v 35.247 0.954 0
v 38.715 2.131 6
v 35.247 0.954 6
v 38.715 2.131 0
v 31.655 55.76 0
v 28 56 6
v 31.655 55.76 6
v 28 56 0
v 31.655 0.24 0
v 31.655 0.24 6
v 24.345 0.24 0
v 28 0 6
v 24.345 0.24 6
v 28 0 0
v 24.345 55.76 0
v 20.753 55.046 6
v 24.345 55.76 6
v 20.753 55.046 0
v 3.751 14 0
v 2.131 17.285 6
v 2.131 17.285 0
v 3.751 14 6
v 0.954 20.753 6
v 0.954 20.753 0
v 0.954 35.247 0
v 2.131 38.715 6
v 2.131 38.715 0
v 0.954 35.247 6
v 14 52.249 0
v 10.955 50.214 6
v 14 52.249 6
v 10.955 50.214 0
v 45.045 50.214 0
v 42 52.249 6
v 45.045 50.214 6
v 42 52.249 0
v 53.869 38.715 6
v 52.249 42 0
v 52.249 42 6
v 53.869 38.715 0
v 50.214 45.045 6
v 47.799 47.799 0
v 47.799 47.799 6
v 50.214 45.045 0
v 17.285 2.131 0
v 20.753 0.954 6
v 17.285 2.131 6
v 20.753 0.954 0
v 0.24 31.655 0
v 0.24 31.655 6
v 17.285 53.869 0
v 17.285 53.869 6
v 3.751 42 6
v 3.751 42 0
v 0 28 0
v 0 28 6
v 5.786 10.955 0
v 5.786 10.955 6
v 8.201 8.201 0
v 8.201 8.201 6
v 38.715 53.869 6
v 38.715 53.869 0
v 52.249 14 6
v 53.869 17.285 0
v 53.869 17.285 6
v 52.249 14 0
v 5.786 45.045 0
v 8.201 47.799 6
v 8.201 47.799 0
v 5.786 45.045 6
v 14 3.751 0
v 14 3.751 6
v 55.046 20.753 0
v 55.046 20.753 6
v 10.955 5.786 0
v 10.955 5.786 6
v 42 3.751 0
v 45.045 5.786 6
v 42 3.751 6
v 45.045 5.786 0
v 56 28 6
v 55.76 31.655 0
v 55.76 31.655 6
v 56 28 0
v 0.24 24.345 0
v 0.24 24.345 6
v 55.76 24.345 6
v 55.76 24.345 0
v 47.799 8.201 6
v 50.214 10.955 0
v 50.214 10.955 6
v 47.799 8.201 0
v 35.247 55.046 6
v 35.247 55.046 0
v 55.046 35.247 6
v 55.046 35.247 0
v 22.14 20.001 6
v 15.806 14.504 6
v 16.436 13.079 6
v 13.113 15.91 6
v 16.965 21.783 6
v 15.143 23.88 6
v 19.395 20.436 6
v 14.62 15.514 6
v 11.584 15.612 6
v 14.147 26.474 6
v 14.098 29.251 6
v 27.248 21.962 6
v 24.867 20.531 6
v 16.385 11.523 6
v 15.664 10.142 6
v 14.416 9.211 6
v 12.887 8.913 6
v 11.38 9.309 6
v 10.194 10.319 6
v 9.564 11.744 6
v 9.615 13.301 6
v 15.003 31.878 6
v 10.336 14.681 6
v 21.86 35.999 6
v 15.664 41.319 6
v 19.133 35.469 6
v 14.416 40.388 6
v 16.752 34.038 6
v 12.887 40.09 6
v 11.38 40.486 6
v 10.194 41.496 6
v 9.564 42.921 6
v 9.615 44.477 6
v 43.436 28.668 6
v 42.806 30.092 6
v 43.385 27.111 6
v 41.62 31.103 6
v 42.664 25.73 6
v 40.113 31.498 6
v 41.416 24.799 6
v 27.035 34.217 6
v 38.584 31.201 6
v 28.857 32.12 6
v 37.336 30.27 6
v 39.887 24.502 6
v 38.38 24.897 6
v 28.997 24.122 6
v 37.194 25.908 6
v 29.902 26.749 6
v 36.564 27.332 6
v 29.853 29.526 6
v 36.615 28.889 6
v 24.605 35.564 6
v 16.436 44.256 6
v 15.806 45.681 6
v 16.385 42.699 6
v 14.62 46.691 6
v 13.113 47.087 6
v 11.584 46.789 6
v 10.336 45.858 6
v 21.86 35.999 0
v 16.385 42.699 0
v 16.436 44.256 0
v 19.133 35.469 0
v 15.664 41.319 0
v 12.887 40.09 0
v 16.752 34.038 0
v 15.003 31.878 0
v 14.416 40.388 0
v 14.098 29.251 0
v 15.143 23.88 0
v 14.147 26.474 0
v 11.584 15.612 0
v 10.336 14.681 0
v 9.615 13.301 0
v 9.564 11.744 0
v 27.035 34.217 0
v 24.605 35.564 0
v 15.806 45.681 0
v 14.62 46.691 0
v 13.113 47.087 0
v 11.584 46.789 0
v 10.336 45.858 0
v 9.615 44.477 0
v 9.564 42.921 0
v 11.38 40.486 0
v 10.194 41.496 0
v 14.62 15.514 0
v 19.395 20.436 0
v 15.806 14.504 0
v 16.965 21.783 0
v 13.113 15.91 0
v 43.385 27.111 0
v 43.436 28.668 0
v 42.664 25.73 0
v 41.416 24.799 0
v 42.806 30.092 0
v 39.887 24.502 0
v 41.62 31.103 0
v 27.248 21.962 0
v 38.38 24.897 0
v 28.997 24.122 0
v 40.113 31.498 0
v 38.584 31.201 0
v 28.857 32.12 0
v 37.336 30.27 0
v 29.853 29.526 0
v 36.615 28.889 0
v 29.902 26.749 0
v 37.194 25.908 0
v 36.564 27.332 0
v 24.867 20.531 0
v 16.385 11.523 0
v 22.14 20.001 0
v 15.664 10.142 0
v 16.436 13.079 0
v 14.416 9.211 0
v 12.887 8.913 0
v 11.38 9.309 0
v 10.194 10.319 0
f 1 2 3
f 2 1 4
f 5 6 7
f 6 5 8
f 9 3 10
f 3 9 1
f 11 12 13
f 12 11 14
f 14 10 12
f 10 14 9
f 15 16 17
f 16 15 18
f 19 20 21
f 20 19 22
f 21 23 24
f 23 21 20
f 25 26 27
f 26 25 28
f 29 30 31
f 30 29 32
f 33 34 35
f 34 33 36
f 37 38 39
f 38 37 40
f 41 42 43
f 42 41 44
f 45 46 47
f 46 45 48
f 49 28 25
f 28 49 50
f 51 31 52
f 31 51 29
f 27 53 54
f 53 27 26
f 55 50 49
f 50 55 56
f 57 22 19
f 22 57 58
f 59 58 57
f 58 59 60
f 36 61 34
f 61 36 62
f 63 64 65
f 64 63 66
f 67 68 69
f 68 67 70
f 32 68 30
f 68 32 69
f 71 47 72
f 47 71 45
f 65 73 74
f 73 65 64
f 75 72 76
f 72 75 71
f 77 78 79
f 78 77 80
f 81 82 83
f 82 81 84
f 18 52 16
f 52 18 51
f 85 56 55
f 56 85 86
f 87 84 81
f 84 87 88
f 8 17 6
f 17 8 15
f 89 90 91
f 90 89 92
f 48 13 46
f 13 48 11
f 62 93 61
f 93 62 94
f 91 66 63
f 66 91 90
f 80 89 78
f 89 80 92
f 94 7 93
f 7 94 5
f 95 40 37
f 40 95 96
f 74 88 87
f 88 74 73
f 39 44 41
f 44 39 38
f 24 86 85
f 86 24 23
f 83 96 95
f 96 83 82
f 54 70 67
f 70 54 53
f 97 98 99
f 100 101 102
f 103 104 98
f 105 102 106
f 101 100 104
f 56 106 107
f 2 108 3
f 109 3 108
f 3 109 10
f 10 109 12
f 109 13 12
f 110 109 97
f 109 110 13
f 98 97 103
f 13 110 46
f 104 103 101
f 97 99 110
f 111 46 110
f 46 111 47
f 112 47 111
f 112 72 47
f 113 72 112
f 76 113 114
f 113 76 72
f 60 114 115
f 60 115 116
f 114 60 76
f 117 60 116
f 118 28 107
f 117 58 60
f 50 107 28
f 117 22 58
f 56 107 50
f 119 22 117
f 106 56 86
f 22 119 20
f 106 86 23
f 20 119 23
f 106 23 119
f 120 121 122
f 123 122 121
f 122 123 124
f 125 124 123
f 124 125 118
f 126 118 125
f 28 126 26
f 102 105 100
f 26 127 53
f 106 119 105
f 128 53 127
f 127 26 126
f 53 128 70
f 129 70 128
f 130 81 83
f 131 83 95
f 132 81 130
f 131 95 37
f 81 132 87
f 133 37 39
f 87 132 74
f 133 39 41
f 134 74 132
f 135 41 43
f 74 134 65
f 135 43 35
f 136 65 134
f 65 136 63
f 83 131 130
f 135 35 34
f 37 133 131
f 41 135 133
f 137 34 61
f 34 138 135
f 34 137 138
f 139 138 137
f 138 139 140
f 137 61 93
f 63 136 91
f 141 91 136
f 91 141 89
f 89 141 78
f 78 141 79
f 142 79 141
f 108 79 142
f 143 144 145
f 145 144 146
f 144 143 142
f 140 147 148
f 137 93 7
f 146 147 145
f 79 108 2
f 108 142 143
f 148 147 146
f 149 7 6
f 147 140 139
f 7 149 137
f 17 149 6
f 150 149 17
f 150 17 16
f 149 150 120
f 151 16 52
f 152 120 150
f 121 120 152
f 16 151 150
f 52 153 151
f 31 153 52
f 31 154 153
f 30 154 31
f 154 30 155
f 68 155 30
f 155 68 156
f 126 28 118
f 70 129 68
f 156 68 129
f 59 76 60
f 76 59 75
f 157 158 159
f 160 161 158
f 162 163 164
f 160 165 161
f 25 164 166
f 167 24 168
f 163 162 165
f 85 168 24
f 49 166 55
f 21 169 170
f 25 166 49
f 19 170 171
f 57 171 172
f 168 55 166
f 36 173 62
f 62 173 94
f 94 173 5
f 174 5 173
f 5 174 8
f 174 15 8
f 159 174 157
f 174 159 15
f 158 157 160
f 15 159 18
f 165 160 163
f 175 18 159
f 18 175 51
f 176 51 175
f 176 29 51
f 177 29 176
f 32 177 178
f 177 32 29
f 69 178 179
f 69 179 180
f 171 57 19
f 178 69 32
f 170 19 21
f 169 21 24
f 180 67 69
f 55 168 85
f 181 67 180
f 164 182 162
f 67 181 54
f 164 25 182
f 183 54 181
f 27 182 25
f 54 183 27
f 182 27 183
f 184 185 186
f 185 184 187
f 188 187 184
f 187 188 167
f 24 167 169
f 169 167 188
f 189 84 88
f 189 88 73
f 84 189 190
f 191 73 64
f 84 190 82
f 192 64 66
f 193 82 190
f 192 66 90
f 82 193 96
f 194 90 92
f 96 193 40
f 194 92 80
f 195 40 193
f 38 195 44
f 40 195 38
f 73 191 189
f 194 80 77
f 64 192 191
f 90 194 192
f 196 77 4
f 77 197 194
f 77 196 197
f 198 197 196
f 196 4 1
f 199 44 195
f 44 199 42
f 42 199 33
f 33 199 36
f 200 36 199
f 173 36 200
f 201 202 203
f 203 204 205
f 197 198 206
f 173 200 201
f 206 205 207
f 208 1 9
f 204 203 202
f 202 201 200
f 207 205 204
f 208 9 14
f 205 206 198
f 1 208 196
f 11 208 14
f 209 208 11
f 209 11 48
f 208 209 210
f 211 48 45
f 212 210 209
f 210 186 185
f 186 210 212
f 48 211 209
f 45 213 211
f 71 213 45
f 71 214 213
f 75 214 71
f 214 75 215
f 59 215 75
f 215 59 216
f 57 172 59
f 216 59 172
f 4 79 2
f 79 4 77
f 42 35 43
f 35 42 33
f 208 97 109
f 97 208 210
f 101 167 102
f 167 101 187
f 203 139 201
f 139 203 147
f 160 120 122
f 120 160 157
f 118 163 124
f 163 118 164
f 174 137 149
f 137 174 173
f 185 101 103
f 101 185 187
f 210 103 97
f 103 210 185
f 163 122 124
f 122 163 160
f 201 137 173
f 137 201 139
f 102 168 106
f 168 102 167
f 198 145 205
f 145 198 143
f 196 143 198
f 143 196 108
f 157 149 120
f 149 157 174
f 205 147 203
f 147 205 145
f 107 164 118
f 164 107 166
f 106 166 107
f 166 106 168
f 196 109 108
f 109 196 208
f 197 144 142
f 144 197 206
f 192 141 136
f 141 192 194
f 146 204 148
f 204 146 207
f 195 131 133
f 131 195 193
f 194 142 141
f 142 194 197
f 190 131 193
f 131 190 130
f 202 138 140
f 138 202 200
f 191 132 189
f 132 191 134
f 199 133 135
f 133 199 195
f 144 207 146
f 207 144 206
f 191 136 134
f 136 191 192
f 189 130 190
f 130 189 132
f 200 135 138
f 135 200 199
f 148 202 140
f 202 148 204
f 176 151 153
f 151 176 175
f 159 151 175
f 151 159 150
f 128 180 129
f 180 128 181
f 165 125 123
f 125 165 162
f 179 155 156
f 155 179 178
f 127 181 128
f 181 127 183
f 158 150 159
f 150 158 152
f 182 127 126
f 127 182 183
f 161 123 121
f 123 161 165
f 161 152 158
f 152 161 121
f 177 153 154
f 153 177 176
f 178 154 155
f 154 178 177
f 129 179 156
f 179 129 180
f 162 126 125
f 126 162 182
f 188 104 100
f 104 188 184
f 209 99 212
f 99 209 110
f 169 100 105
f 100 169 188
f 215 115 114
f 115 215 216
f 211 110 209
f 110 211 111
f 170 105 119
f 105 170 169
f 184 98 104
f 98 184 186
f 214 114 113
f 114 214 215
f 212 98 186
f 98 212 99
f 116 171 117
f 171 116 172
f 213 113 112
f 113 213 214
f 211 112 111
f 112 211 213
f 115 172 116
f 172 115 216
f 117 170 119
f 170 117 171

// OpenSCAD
$fn = 32;

// ----------------------------------------------------------------------
// Cam plate: eccentric cam, base R28
// ----------------------------------------------------------------------

// --- parameters (mm) ---
base_r = 28;              // base circle radius
lobe_h = 8;               // cam lobe rise
bore_r = 8;               // shaft bore radius
plate_t = 6;              // plate thickness, Z (extrusion height)
ecc = 6;                  // disc eccentricity
ring_r = 18;              // lightening ring radius
bolt_r = 3.5;             // lightening hole radius
fit_tol = 0.1;            // declared fit tolerance (prompt contract)
free_tol = 0.5;           // declared free tolerance (prompt contract)

profile = [[56, 28], [55.76, 31.655], [55.046, 35.247], [53.869, 38.715], [52.249, 42], [50.214, 45.045], [47.799, 47.799], [45.045, 50.214], [42, 52.249], [38.715, 53.869], [35.247, 55.046], [31.655, 55.76], [28, 56], [24.345, 55.76], [20.753, 55.046], [17.285, 53.869], [14, 52.249], [10.955, 50.214], [8.201, 47.799], [5.786, 45.045], [3.751, 42], [2.131, 38.715], [0.954, 35.247], [0.24, 31.655], [0, 28], [0.24, 24.345], [0.954, 20.753], [2.131, 17.285], [3.751, 14], [5.786, 10.955], [8.201, 8.201], [10.955, 5.786], [14, 3.751], [17.285, 2.131], [20.753, 0.954], [24.345, 0.24], [28, 0], [31.655, 0.24], [35.247, 0.954], [38.715, 2.131], [42, 3.751], [45.045, 5.786], [47.799, 8.201], [50.214, 10.955], [52.249, 14], [53.869, 17.285], [55.046, 20.753], [55.76, 24.345]];  // primary outline, 48 points, counter clockwise
void_1 = [[29.853, 29.526], [28.857, 32.12], [27.035, 34.217], [24.605, 35.564], [21.86, 35.999], [19.133, 35.469], [16.752, 34.038], [15.003, 31.878], [14.098, 29.251], [14.147, 26.474], [15.143, 23.88], [16.965, 21.783], [19.395, 20.436], [22.14, 20.001], [24.867, 20.531], [27.248, 21.962], [28.997, 24.122], [29.902, 26.749]];  // shaft bore, 18 points
void_2 = [[43.436, 28.668], [42.806, 30.092], [41.62, 31.103], [40.113, 31.498], [38.584, 31.201], [37.336, 30.27], [36.615, 28.889], [36.564, 27.332], [37.194, 25.908], [38.38, 24.897], [39.887, 24.502], [41.416, 24.799], [42.664, 25.73], [43.385, 27.111]];  // lightening hole 1, 14 points
void_3 = [[16.436, 44.256], [15.806, 45.681], [14.62, 46.691], [13.113, 47.087], [11.584, 46.789], [10.336, 45.858], [9.615, 44.477], [9.564, 42.921], [10.194, 41.496], [11.38, 40.486], [12.887, 40.09], [14.416, 40.388], [15.664, 41.319], [16.385, 42.699]];  // lightening hole 2, 14 points
void_4 = [[16.436, 13.079], [15.806, 14.504], [14.62, 15.514], [13.113, 15.91], [11.584, 15.612], [10.336, 14.681], [9.615, 13.301], [9.564, 11.744], [10.194, 10.319], [11.38, 9.309], [12.887, 8.913], [14.416, 9.211], [15.664, 10.142], [16.385, 11.523]];  // lightening hole 3, 14 points

// --- the one profile operation ---
difference() {
  linear_extrude(height = plate_t) polygon(points = profile);
  translate([0, 0, -1])
    linear_extrude(height = plate_t + 2) polygon(points = void_1);
  translate([0, 0, -1])
    linear_extrude(height = plate_t + 2) polygon(points = void_2);
  translate([0, 0, -1])
    linear_extrude(height = plate_t + 2) polygon(points = void_3);
  translate([0, 0, -1])
    linear_extrude(height = plate_t + 2) polygon(points = void_4);
}
